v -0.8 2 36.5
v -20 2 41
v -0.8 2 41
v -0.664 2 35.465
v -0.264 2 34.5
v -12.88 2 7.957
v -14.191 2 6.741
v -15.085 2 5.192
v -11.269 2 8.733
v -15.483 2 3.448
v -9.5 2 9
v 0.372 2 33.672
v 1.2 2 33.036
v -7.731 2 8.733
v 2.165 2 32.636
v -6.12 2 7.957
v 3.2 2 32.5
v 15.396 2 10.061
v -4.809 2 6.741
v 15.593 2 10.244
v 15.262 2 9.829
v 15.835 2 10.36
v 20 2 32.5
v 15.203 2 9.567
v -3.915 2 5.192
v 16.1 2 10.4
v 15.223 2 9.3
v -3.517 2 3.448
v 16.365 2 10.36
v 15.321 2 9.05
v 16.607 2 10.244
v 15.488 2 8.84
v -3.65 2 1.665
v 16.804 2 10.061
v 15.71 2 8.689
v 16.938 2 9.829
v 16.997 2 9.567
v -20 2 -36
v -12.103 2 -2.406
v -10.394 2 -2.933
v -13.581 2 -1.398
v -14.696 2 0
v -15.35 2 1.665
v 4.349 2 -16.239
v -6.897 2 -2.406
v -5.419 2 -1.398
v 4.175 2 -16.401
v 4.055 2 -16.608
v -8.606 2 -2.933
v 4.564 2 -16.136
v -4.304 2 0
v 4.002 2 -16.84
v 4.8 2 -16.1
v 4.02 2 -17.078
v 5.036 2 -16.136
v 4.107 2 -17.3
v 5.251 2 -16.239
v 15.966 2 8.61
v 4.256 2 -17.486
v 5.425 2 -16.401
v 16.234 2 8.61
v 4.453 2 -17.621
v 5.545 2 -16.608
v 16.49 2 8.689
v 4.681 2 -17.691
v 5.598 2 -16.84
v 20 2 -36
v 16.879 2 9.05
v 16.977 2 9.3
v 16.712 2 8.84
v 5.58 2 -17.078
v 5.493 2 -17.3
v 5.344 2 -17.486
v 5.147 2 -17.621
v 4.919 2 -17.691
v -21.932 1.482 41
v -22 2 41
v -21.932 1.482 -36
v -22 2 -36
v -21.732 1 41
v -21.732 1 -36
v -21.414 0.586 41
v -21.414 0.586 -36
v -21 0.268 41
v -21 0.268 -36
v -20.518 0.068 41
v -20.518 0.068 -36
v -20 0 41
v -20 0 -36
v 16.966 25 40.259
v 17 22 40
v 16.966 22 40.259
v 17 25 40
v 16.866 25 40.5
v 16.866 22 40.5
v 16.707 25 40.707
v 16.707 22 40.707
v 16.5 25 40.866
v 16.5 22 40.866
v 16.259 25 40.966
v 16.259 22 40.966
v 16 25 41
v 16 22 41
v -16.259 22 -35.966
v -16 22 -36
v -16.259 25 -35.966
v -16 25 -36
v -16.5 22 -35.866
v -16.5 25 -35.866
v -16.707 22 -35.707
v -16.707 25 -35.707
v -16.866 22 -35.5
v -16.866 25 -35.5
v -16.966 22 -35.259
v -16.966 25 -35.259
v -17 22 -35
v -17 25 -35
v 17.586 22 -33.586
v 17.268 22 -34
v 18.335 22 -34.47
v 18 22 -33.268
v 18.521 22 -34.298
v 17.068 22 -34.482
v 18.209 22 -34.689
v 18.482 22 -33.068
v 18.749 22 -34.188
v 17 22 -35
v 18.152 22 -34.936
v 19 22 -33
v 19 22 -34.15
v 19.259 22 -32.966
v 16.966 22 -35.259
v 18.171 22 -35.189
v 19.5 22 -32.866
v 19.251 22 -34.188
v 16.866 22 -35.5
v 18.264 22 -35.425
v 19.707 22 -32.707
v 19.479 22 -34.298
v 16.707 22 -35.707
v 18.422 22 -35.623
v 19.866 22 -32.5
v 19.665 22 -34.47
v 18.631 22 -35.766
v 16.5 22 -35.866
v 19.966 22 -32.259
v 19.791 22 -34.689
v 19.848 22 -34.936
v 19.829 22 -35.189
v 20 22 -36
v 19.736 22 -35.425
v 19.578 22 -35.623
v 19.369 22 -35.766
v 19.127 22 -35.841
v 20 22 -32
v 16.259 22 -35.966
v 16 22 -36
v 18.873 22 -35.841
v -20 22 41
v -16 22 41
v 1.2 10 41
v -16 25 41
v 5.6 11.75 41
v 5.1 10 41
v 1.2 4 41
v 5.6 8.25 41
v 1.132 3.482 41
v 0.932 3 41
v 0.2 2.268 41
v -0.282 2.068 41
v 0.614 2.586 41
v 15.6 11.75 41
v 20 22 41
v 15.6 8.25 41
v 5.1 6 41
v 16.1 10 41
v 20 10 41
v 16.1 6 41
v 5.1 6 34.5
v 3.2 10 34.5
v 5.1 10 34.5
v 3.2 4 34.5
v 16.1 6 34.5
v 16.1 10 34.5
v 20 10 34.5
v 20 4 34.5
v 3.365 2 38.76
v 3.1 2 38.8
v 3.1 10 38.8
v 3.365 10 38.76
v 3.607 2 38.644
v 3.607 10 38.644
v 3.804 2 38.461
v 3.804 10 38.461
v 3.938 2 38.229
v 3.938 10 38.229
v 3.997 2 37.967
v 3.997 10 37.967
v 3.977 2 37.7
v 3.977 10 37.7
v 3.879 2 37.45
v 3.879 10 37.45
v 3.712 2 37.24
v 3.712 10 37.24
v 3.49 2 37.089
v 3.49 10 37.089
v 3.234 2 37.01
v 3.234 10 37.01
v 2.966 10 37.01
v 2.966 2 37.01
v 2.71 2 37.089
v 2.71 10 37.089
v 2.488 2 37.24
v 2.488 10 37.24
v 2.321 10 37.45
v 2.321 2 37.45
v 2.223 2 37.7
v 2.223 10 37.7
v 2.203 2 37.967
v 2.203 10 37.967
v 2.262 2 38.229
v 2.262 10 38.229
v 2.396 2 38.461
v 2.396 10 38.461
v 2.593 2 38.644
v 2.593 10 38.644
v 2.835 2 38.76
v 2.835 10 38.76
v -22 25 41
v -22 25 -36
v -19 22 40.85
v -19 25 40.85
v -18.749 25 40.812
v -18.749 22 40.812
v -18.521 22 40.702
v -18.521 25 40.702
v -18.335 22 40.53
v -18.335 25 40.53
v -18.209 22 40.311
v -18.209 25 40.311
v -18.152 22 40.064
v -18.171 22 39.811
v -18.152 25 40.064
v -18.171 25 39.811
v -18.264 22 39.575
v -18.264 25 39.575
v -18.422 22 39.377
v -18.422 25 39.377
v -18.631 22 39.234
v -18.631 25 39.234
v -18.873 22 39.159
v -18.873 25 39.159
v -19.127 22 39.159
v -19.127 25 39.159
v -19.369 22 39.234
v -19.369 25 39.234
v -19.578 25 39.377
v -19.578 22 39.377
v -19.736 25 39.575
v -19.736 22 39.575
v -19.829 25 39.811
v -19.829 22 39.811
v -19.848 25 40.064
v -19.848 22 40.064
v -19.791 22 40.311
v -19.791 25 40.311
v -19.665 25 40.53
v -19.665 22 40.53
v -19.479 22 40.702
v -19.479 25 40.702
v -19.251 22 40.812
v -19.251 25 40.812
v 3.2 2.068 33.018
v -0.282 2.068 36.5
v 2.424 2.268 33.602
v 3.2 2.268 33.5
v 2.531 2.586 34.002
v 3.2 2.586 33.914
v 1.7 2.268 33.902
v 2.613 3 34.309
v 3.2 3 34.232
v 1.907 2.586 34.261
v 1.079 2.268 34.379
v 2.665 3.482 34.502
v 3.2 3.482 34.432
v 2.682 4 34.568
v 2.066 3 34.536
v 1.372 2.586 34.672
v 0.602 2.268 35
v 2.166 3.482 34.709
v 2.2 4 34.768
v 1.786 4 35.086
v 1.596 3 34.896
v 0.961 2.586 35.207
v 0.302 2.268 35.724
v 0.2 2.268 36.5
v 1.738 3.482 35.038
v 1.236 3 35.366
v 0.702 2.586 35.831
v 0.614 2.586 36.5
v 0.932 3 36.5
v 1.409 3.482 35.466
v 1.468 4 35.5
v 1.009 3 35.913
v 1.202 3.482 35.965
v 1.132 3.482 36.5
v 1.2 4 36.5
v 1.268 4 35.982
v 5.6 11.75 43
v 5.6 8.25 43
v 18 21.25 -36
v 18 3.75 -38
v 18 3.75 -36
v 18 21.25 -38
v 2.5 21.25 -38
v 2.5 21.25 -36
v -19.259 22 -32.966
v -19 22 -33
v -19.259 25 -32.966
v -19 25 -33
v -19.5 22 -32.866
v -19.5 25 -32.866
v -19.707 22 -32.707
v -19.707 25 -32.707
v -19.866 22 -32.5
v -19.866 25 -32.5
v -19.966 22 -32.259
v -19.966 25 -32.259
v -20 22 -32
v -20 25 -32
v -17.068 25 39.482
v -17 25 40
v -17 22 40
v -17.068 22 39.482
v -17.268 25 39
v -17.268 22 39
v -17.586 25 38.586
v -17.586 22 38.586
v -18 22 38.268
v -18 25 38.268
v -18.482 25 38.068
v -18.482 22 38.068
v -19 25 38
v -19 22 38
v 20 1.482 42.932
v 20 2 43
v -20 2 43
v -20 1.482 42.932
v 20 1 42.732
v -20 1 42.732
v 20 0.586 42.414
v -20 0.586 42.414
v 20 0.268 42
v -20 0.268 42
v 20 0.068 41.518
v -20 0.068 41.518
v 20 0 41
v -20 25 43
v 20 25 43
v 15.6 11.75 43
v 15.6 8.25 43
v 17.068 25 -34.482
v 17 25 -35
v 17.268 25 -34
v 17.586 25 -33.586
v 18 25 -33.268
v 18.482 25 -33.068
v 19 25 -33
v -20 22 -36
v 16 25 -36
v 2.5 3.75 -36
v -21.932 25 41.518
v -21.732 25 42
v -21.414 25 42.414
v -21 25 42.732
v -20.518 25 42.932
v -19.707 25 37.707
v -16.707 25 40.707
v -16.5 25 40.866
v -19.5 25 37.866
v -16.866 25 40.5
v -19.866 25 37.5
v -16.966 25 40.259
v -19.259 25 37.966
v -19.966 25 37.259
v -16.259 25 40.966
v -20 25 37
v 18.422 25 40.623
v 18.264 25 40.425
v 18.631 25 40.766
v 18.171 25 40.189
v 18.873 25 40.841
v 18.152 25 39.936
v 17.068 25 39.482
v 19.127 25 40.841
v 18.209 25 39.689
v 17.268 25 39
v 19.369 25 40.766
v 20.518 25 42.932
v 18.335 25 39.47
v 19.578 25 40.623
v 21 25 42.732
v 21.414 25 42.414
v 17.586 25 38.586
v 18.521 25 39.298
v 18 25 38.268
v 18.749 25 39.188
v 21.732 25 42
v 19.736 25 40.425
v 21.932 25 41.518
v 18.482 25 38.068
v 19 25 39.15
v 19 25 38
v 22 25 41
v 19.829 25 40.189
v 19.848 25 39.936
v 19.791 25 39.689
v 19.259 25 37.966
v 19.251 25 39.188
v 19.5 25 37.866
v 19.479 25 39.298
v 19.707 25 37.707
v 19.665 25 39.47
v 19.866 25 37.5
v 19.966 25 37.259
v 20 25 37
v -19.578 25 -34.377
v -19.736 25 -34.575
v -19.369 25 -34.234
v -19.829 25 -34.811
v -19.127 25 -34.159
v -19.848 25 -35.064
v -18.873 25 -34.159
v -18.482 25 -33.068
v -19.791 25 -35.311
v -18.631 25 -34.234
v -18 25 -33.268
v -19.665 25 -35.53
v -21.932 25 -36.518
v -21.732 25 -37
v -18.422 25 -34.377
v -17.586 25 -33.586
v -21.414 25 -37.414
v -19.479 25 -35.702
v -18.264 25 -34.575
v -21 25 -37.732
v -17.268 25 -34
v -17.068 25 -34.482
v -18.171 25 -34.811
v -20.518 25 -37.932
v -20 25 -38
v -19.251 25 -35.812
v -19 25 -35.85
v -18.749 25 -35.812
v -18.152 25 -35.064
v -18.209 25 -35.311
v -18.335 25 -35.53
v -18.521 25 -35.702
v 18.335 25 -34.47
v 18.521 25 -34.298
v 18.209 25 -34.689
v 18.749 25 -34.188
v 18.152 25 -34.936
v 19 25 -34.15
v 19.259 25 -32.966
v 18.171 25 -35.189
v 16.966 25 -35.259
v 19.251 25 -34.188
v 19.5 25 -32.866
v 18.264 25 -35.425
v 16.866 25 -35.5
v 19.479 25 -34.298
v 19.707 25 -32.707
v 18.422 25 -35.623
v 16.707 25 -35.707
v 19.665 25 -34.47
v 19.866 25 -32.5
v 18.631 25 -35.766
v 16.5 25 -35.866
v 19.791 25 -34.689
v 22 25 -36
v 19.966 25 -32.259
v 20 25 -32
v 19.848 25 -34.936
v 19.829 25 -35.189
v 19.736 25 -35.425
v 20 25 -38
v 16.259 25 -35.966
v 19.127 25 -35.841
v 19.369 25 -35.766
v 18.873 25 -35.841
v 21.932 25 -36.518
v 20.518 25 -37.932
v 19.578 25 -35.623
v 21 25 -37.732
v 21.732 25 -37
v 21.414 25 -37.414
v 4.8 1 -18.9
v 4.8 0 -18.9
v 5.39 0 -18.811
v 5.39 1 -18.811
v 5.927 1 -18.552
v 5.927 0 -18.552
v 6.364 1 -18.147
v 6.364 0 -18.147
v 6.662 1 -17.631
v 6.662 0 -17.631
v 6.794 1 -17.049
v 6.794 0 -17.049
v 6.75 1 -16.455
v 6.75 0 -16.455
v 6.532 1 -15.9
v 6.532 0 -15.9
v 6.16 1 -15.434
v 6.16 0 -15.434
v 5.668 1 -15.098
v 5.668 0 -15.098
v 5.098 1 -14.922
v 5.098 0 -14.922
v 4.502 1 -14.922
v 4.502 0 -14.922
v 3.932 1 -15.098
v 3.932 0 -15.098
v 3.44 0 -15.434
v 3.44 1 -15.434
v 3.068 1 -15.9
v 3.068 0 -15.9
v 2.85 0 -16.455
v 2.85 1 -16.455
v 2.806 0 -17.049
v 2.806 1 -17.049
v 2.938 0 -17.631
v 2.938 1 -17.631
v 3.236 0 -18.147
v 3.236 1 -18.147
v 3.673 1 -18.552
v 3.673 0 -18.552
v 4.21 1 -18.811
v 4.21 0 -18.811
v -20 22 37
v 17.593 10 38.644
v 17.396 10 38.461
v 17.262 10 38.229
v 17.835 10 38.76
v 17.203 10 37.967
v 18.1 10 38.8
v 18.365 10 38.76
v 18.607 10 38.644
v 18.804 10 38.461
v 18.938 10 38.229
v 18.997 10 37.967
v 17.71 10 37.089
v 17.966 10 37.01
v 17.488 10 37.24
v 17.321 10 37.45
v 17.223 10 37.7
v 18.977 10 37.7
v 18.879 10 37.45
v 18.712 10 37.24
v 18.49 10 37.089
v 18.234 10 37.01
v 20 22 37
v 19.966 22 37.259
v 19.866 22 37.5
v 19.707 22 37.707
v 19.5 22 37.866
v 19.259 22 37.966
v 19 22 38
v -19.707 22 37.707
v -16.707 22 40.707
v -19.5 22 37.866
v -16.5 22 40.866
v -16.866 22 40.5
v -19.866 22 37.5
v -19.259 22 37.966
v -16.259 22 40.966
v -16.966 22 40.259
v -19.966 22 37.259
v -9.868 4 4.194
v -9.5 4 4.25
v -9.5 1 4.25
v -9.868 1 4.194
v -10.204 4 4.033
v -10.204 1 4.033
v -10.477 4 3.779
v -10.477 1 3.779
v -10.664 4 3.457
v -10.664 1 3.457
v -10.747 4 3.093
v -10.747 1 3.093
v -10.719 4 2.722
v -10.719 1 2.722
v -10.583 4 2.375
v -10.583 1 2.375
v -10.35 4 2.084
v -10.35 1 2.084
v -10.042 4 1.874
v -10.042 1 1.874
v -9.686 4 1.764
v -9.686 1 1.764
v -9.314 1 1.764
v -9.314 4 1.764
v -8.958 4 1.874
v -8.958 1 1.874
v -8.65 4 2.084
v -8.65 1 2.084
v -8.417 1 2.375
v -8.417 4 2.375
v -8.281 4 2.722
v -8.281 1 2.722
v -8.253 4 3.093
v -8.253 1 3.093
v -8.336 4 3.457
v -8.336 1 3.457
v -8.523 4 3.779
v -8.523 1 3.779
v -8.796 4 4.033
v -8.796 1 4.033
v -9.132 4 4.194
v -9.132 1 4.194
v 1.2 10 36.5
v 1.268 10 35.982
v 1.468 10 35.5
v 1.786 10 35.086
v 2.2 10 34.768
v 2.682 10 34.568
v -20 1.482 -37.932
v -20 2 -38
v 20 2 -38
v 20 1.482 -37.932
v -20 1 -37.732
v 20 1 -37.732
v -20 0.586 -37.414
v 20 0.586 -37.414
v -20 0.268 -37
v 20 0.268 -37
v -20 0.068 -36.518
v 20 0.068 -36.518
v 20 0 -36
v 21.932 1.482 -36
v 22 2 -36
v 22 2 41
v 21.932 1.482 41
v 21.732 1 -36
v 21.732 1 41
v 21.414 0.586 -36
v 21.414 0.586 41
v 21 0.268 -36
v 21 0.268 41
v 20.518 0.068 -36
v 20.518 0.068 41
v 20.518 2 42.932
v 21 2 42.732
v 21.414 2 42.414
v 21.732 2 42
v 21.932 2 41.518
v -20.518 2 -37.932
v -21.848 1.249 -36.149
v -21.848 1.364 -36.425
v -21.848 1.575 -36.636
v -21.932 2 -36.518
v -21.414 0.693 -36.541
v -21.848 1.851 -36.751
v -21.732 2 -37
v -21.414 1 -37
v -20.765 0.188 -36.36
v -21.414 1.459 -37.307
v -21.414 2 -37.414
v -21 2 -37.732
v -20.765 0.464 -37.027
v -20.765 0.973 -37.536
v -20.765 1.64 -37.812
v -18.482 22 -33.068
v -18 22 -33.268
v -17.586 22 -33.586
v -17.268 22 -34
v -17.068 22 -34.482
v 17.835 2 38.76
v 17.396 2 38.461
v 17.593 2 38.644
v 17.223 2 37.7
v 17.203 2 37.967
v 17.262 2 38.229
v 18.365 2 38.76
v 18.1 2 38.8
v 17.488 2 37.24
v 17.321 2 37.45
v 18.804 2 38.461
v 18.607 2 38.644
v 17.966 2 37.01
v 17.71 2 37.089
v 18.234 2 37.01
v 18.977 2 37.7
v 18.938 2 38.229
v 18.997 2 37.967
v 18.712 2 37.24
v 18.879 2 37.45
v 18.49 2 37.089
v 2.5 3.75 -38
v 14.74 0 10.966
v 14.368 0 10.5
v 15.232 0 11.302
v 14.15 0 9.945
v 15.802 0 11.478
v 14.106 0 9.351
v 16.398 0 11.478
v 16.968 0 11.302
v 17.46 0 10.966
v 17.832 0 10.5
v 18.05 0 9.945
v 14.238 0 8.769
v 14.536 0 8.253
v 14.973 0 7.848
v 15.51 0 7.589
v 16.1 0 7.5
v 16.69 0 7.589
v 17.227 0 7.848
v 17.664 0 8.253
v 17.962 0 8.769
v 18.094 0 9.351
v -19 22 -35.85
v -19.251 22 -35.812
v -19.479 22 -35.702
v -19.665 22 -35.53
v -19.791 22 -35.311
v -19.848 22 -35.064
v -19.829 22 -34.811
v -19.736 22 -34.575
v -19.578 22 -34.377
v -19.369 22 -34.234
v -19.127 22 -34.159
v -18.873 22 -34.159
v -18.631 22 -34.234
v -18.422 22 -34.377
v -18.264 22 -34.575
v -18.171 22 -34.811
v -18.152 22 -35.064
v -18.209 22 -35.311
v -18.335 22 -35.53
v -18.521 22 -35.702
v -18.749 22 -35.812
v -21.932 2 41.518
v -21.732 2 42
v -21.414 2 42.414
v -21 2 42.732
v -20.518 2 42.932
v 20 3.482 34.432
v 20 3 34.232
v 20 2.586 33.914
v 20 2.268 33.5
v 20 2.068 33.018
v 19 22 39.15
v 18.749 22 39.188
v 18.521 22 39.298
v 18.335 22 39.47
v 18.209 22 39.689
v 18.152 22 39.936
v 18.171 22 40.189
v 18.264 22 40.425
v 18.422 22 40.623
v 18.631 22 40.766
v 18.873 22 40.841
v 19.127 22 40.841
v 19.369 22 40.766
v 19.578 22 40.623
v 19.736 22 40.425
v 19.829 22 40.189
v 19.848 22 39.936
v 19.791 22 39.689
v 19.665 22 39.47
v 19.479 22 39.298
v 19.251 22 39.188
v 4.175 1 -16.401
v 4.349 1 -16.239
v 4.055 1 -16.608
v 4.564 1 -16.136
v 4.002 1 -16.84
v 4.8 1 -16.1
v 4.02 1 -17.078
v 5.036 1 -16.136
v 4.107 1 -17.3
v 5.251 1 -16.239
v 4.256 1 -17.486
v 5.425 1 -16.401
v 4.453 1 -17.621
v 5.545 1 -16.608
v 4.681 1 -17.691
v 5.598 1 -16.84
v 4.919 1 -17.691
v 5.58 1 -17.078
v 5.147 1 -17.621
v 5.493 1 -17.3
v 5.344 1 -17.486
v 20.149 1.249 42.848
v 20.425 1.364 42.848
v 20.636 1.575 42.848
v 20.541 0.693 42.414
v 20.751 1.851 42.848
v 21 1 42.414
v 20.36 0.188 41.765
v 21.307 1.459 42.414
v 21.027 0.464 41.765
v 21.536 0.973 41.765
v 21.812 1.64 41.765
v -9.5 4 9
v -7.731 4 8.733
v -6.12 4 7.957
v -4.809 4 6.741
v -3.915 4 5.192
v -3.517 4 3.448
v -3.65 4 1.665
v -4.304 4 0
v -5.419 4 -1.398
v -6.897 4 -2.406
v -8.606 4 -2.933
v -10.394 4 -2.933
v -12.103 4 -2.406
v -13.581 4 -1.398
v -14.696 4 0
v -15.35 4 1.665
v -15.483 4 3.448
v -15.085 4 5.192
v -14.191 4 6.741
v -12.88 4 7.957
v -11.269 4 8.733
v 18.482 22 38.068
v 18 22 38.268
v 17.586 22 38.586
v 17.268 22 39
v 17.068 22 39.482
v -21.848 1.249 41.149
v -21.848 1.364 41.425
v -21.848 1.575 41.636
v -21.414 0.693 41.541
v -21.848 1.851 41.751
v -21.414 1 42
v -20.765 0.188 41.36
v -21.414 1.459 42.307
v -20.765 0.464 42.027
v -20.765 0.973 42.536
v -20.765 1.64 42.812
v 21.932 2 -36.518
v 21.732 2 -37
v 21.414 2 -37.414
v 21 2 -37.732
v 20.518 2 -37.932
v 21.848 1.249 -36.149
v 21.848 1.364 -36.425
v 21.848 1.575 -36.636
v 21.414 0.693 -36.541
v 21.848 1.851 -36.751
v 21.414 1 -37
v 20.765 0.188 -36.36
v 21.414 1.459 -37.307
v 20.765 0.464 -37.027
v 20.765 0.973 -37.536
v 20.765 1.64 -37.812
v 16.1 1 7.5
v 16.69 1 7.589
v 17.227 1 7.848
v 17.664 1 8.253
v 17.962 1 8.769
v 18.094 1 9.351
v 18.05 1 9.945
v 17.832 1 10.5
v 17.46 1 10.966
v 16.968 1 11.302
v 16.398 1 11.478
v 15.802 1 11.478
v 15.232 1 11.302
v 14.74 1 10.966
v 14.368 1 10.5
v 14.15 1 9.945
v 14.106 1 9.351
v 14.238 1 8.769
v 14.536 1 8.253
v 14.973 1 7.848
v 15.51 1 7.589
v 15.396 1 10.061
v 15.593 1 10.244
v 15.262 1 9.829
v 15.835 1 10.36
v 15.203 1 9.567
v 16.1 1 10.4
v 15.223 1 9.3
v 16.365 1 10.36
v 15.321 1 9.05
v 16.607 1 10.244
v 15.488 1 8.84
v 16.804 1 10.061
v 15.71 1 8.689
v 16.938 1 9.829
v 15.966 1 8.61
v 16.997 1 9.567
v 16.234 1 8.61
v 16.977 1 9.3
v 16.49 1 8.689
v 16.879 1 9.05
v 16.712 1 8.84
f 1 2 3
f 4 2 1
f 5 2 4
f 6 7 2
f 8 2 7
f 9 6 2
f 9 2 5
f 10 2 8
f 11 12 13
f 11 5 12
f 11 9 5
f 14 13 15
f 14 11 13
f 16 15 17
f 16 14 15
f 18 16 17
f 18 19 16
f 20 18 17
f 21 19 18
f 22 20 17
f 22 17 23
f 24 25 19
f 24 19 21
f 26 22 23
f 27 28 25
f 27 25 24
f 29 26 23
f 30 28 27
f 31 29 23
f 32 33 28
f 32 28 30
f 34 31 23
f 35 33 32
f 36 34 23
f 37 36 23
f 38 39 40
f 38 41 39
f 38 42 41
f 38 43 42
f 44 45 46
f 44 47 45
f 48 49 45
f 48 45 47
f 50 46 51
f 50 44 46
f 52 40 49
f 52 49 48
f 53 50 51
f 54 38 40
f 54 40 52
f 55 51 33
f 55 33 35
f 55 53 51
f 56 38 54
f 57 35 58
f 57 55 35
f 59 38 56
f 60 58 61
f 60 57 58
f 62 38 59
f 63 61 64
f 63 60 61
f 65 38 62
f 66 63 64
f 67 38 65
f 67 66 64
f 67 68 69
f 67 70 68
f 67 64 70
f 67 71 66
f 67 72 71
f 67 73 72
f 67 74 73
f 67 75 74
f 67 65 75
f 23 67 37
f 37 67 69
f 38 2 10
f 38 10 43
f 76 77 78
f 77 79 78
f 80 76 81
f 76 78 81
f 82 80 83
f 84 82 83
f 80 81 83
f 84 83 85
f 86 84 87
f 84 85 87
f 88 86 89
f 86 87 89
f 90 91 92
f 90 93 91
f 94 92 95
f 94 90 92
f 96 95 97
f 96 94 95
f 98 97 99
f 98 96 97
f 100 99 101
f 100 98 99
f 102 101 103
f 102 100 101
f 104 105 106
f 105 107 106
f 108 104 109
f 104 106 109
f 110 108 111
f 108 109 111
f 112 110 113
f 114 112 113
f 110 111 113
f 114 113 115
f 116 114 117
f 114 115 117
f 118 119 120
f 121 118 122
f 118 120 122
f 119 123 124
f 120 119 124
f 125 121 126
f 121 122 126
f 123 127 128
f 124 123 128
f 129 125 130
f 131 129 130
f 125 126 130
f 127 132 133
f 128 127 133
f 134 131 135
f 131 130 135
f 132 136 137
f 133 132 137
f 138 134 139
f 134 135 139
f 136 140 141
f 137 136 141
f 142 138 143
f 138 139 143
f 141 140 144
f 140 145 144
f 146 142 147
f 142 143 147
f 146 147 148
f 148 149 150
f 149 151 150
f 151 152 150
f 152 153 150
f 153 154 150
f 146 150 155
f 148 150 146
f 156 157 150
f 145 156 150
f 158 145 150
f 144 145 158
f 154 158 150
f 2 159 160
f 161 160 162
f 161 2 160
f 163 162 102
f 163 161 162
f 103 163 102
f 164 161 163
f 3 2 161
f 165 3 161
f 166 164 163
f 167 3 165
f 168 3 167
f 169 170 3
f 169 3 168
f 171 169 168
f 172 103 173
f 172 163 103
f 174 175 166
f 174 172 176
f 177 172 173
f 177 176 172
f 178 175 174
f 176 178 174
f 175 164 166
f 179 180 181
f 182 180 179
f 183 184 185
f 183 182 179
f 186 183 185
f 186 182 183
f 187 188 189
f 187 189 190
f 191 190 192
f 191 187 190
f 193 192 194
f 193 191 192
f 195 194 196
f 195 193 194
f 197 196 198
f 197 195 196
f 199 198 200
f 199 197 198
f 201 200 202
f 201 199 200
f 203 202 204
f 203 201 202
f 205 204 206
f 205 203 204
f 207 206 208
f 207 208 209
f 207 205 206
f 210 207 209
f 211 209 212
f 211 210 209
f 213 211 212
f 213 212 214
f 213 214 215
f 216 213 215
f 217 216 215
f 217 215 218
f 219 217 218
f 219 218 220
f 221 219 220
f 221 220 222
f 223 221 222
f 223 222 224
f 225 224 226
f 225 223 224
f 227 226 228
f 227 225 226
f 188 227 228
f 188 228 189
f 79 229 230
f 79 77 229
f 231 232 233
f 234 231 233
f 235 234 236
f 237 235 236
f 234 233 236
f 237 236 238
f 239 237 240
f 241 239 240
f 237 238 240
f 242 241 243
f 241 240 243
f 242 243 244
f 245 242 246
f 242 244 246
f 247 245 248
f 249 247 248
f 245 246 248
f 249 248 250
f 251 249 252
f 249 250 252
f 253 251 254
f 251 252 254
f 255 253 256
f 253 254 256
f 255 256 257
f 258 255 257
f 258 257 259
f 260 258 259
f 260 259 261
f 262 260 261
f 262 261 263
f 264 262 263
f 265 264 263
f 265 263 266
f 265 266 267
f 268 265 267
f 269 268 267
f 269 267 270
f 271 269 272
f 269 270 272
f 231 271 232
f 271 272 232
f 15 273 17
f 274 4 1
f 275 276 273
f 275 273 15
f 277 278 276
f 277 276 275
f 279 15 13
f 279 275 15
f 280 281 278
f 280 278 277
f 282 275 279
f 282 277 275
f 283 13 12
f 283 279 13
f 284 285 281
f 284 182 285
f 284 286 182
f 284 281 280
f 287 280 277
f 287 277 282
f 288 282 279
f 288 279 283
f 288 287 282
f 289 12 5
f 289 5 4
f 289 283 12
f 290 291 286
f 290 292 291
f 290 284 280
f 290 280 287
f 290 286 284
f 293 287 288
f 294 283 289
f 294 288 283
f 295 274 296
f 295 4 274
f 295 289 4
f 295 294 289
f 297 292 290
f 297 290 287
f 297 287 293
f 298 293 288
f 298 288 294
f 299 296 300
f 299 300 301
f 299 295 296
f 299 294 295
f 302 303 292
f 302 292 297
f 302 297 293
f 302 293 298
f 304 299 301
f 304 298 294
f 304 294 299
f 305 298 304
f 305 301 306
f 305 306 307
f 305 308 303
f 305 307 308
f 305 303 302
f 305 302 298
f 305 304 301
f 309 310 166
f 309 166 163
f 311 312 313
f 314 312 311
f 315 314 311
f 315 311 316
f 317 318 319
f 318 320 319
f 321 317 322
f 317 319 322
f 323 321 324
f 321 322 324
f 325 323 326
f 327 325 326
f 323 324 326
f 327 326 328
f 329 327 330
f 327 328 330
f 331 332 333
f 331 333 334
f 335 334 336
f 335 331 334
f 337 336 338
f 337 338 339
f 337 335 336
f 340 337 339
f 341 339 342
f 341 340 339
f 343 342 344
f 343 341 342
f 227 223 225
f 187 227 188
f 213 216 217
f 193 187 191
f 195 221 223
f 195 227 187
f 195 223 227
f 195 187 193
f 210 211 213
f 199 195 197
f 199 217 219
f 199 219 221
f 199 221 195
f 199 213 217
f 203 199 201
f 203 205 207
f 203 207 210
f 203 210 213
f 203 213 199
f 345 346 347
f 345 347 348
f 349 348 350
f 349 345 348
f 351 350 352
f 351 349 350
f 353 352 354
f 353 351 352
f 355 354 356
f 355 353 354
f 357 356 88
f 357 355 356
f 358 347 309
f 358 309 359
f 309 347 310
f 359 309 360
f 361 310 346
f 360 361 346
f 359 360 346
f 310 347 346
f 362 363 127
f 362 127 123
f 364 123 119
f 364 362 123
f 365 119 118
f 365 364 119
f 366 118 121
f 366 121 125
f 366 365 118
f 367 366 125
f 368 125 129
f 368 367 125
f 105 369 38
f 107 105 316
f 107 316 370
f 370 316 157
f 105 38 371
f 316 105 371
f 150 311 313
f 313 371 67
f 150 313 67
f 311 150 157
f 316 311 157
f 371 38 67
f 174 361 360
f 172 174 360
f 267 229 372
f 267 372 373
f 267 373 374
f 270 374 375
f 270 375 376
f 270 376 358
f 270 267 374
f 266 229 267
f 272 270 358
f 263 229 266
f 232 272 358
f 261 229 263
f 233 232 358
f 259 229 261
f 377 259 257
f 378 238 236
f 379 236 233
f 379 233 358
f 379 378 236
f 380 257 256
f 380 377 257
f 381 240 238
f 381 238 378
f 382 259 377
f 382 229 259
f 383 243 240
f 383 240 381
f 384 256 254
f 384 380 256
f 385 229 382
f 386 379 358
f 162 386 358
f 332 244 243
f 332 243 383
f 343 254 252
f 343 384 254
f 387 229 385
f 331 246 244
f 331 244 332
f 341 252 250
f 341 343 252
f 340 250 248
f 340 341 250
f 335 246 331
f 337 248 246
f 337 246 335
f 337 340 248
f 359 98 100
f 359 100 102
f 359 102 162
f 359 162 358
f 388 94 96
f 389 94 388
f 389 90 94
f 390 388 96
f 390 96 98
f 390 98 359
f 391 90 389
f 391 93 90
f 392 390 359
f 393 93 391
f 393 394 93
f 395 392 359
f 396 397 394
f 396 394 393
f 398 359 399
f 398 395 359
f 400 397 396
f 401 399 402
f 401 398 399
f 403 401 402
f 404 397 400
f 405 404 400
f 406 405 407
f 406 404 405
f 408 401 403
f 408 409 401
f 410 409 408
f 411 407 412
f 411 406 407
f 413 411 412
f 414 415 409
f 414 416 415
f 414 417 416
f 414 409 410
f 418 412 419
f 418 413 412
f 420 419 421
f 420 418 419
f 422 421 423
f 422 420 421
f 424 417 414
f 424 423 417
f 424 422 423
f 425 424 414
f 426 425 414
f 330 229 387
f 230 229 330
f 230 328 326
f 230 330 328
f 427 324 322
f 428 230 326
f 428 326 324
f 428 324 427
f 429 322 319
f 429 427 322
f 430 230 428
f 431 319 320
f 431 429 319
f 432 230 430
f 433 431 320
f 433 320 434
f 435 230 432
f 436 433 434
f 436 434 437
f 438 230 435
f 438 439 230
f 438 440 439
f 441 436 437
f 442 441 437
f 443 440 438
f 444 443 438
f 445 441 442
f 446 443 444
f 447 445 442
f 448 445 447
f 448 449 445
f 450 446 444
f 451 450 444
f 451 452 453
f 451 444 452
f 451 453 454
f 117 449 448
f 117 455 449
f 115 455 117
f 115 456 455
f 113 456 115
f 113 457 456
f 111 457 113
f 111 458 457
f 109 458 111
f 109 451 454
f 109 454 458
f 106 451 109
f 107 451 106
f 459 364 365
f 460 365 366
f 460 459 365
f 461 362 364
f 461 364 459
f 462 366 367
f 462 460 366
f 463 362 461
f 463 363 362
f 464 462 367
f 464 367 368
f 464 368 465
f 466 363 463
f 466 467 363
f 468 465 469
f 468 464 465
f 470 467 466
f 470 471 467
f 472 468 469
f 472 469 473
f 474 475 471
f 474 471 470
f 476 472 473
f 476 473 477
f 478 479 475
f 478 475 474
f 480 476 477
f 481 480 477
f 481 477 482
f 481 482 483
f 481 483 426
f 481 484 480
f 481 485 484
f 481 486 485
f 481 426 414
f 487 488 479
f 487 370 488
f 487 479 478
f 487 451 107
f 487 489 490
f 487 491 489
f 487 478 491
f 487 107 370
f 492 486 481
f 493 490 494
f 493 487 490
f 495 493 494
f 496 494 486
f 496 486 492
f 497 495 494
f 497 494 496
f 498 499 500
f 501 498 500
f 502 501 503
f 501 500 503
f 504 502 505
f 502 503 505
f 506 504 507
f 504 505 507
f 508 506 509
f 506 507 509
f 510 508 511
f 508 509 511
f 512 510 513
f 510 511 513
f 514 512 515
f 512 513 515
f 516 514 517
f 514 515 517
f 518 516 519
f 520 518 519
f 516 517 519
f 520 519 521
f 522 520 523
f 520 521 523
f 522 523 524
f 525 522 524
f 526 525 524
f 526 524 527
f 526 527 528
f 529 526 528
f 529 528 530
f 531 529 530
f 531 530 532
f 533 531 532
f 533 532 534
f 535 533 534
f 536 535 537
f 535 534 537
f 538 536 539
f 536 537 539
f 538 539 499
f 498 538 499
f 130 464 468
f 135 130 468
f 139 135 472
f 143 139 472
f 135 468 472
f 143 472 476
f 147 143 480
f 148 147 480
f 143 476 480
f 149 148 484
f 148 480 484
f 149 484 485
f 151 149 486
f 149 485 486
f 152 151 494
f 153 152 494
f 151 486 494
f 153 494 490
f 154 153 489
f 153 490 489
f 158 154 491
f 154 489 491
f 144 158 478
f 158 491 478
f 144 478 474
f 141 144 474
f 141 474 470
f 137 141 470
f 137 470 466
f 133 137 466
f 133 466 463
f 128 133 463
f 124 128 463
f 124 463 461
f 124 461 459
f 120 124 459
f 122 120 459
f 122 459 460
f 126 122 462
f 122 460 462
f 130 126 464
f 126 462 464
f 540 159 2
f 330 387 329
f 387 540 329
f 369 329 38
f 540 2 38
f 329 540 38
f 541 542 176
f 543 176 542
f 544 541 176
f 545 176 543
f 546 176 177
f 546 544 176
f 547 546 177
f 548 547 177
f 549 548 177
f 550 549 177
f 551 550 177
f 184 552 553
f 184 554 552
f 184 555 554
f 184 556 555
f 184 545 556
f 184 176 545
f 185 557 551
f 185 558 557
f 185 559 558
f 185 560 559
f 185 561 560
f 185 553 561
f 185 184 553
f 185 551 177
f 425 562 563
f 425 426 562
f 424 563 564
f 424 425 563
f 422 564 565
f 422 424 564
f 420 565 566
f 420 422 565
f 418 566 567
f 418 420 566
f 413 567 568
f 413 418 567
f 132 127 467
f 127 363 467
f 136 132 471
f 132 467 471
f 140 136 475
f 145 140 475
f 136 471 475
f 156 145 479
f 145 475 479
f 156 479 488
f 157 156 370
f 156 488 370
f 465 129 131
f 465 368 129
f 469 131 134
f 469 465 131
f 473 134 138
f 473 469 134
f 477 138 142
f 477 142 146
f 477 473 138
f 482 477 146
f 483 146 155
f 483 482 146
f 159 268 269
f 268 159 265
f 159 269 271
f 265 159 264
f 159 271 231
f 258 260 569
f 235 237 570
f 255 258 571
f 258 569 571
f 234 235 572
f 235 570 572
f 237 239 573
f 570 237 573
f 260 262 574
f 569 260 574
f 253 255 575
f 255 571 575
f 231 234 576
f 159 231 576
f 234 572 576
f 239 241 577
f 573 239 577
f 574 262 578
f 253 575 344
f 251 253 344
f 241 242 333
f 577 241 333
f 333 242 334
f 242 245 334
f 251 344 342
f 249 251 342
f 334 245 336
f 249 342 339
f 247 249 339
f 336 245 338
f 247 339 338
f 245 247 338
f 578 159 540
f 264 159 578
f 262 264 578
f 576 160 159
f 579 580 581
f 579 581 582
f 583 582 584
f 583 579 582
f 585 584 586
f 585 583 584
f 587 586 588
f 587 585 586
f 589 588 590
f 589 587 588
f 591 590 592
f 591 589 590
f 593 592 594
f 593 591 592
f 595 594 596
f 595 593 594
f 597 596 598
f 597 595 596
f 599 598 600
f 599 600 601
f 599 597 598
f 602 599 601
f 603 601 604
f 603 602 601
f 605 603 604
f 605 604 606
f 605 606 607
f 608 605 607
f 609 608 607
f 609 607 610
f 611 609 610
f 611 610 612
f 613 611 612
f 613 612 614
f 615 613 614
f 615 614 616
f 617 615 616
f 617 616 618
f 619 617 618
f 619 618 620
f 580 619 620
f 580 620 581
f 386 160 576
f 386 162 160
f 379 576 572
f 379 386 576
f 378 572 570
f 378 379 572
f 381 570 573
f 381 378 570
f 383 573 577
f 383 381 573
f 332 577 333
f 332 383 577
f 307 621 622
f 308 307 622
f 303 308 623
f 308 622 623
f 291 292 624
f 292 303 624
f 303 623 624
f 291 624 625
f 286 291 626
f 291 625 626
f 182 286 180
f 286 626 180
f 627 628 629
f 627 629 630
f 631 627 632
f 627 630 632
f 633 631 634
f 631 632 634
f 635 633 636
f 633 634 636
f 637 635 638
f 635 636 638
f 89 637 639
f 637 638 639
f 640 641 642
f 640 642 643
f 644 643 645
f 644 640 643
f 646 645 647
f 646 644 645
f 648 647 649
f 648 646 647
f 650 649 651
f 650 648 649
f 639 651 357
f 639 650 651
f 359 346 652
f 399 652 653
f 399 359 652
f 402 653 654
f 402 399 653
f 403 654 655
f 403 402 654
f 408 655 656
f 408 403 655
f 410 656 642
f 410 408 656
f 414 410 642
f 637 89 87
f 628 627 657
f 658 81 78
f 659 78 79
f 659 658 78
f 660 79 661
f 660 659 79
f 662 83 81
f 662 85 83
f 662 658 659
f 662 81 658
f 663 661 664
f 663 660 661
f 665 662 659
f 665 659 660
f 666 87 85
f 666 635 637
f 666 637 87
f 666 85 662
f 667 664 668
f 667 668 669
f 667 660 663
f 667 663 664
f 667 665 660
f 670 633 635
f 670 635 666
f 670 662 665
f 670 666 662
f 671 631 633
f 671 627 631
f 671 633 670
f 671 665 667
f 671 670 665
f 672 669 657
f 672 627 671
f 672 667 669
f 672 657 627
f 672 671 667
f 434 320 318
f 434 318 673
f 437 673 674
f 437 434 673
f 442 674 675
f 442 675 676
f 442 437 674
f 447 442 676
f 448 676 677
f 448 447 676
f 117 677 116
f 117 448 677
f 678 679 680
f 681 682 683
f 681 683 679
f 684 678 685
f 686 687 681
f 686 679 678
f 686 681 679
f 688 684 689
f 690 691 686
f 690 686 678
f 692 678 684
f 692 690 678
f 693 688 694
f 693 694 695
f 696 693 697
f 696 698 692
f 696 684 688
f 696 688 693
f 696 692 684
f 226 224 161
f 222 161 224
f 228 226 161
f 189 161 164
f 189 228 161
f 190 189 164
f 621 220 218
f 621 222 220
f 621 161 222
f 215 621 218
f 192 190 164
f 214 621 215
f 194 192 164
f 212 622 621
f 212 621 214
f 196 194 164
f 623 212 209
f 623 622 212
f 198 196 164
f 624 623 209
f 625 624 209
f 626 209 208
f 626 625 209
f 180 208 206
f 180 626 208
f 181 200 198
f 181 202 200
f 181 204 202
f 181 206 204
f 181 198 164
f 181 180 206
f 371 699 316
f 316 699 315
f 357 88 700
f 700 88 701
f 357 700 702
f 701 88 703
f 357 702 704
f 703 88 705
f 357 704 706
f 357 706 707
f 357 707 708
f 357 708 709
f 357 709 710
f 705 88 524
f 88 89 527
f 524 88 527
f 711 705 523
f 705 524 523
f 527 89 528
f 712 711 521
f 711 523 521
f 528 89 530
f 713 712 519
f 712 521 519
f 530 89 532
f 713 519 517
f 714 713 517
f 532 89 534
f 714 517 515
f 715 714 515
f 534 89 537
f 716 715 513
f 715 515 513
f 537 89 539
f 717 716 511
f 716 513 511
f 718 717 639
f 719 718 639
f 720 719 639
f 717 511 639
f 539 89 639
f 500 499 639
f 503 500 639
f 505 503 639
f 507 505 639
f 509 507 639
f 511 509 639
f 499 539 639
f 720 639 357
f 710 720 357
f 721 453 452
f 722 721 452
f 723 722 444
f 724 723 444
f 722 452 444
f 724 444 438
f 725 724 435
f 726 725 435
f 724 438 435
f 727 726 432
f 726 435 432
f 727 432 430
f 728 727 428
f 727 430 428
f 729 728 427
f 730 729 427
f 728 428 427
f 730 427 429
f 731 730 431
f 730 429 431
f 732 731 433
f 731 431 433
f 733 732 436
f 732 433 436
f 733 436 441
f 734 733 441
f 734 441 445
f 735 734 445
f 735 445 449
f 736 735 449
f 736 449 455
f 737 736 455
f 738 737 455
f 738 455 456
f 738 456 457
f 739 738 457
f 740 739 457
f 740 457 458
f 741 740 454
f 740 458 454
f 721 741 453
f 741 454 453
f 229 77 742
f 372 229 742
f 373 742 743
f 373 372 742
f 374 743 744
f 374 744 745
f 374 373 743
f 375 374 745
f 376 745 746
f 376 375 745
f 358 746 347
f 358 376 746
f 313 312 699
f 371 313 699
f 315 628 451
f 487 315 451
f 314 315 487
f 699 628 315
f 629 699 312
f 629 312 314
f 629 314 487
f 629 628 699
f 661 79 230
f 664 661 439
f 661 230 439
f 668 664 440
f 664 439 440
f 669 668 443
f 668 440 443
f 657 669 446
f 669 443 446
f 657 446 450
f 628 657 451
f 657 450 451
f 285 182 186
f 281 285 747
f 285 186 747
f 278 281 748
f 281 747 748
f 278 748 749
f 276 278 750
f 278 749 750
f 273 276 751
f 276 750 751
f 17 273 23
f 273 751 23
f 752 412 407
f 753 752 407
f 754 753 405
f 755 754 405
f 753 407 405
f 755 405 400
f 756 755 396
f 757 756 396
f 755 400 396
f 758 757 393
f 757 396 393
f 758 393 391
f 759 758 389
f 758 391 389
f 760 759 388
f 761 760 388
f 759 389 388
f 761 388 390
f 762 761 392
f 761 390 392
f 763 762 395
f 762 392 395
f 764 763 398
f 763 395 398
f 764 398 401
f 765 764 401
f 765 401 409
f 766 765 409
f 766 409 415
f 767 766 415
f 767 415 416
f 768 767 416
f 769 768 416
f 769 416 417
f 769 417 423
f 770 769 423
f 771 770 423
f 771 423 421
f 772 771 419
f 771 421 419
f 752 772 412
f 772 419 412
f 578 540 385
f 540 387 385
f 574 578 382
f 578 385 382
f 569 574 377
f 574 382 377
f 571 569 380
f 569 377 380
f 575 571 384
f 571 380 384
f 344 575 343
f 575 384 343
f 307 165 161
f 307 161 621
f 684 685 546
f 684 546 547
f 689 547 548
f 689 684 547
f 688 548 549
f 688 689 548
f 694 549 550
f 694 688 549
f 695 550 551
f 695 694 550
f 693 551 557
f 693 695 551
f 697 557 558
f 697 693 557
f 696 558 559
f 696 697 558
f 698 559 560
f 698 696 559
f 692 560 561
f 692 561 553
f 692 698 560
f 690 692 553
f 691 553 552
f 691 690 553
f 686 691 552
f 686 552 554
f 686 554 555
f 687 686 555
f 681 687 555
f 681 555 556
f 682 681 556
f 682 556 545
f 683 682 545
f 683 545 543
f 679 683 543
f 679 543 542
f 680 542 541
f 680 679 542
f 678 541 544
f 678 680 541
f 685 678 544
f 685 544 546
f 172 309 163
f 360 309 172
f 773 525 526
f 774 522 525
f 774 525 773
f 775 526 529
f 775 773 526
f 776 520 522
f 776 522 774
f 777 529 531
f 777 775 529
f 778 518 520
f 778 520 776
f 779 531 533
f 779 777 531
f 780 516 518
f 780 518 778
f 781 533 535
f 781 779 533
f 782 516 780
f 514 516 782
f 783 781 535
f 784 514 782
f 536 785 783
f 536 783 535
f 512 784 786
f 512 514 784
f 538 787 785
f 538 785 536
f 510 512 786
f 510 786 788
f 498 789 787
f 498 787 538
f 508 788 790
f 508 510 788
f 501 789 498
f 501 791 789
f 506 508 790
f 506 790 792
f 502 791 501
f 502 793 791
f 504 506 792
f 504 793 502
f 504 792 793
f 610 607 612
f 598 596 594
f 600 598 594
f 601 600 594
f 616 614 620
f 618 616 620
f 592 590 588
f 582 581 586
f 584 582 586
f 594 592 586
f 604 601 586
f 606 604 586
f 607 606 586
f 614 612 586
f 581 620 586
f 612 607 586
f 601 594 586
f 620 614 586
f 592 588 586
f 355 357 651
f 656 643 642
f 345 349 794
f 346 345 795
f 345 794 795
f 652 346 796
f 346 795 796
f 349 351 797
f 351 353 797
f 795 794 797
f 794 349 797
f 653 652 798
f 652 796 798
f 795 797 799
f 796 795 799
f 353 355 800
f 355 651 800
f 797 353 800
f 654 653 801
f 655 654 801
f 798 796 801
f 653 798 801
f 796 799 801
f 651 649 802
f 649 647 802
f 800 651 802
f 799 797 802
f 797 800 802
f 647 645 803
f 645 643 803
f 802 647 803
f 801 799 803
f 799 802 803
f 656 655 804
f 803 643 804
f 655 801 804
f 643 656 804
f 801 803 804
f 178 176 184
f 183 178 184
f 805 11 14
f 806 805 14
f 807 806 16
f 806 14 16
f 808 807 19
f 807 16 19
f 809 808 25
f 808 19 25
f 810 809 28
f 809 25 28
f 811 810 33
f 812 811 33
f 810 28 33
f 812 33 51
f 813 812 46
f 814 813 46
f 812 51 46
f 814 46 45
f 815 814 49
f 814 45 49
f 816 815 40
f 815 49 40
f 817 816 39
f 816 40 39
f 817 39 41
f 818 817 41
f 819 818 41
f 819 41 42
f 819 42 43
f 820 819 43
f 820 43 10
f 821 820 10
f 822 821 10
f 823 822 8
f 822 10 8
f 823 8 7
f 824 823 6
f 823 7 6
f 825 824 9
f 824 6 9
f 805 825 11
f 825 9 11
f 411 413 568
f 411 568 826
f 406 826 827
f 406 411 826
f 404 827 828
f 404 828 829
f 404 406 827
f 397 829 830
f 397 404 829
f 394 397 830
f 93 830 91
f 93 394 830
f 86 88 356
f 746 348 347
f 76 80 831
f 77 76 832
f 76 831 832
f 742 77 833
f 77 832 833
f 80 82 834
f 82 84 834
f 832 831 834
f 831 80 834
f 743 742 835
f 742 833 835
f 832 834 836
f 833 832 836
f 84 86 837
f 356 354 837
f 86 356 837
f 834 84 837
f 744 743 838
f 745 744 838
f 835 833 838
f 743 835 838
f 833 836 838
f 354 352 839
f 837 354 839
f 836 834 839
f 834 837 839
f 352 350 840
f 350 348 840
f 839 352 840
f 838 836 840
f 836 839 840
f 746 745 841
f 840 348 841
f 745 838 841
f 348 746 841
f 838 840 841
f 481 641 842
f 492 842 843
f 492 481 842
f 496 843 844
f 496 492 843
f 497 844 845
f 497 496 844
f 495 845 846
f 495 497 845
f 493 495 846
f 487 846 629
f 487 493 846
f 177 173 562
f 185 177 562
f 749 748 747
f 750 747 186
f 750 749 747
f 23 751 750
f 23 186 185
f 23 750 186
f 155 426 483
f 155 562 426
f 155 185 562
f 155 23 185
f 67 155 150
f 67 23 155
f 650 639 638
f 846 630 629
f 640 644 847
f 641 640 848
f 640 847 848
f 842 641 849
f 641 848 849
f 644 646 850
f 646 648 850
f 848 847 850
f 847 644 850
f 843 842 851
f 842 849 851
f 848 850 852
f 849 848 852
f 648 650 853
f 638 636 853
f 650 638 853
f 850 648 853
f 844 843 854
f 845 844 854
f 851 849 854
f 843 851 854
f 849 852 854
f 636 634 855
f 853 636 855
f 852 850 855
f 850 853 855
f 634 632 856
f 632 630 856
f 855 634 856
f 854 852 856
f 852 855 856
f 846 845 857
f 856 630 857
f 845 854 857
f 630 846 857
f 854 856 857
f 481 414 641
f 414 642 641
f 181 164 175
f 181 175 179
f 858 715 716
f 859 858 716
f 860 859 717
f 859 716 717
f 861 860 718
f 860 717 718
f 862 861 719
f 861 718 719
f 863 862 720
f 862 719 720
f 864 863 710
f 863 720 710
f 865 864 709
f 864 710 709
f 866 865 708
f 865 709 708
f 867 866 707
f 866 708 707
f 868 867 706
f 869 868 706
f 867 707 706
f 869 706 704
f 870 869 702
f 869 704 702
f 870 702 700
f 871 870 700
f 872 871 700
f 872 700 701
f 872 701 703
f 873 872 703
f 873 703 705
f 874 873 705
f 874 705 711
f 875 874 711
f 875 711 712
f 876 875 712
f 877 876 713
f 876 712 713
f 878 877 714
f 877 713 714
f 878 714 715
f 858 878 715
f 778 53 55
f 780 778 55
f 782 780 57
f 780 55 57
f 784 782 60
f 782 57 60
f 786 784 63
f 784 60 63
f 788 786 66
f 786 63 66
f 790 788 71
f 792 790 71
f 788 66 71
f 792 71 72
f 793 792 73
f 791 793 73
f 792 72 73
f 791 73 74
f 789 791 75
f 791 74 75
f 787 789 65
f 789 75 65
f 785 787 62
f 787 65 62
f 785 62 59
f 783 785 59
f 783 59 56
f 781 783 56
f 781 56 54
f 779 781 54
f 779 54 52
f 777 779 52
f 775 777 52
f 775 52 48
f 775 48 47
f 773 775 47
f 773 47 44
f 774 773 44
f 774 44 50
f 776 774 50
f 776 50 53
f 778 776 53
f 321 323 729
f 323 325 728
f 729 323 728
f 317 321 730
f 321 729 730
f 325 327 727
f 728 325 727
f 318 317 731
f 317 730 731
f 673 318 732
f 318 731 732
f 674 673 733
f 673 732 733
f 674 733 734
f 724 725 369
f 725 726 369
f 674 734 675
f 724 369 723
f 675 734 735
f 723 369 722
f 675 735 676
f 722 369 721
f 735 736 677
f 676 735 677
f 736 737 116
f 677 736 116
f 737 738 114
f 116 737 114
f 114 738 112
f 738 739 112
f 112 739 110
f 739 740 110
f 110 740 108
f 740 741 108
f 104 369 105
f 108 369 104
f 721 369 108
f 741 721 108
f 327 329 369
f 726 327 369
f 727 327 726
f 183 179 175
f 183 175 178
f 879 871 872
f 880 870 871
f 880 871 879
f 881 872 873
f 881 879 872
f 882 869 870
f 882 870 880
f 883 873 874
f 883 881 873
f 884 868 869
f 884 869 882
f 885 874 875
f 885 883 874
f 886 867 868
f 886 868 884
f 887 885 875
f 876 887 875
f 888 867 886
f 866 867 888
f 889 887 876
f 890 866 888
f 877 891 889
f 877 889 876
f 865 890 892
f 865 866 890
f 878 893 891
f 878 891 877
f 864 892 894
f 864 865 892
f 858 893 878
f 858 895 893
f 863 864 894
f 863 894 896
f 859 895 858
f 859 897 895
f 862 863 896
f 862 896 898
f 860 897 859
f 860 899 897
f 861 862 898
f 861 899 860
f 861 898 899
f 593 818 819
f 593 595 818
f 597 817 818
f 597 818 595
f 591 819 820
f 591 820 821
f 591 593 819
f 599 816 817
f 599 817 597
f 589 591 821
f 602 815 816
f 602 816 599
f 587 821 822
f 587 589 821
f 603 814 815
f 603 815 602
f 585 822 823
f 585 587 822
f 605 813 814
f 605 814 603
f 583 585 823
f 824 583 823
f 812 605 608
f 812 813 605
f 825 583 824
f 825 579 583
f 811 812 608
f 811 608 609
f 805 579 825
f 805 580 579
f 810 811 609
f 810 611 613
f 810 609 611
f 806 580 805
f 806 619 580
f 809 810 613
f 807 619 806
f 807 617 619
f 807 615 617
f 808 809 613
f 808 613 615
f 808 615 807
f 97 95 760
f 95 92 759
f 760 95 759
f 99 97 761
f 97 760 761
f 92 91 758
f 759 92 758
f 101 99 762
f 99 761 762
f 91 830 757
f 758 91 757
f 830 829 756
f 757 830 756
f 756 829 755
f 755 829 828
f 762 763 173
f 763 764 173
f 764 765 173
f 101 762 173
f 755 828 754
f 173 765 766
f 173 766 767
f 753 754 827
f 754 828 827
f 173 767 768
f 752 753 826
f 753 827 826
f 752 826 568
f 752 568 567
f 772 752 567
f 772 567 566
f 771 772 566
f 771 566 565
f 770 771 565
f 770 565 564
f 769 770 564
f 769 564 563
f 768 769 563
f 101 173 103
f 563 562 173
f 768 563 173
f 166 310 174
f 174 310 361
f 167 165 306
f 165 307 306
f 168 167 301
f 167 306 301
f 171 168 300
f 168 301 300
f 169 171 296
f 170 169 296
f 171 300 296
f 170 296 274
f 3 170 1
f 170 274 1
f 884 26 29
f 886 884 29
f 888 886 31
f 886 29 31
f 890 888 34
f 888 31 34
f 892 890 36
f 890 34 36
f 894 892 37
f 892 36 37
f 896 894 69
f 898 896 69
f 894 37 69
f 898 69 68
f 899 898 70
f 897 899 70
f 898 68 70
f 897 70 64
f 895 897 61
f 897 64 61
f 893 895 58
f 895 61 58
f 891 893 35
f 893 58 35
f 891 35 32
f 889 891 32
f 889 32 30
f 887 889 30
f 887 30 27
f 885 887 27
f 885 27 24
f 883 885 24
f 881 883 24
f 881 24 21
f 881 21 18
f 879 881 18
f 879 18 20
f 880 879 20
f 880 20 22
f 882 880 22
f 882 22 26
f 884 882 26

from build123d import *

# Parameters (mm, degrees)
SKETCH_1_W           = 44
SKETCH_1_H           = 81
EXTRUDE_1_DEPTH      = 25
SHELL_1_T            = -2
FILLET_1_R           = 2
SKETCH_2_R           = 0.8
SKETCH_2_R_2         = 0.9
CUT_EXTRUDE_1_DEPTH  = 24
SKETCH_3_R           = 1.25
CUT_EXTRUDE_2_DEPTH  = 24
SKETCH_4_R           = 6
EXTRUDE_2_DEPTH      = 2
CUT_EXTRUDE_START    = -13.2
SKETCH_6_R           = 1.25
CUT_EXTRUDE_4_DEPTH  = 13.2
SKETCH_7_W           = 15.5
SKETCH_7_H           = 17.5
CUT_EXTRUDE_5_DEPTH  = 13.2
SKETCH_9_W           = 18.8
SKETCH_9_H           = 6.5
SKETCH_9_R           = 0.9
EXTRUDE_3_DEPTH      = 8
SKETCH_11_W          = 11
SKETCH_11_H          = 6.5
CUT_EXTRUDE_6_DEPTH  = 4
SKETCH_12_W          = 10
SKETCH_12_H          = 3.5
CUT_EXTRUDE_7_DEPTH  = 4
FILLET_2_R           = 2
EXTRUDE_START        = -1
SKETCH_14_R          = 1.25
EXTRUDE_4_DEPTH      = 1
SKETCH_15_R          = 2
CUT_EXTRUDE_8_DEPTH  = 1
SKETCH_17_R          = 2
EXTRUDE_5_DEPTH      = 3
SKETCH_18_R          = 0.85
CUT_EXTRUDE_10_DEPTH = 3
FILLET_4_R           = 1


with BuildPart() as part:
    # 草图1 → 凸台-拉伸1 (new body)
    with BuildSketch(Plane(origin=(0, 0, 0), x_dir=(1, 0, 0), z_dir=(0, 1, 0))):
        with Locations((0, -2.5)):
            Rectangle(SKETCH_1_W, SKETCH_1_H)
    extrude(amount=EXTRUDE_1_DEPTH)

    # 抽壳1
    shell_1_openings = [part.faces().sort_by_distance(p)[0] for p in [
        (0, 25, 2.5),
    ]]
    offset(amount=SHELL_1_T, openings=shell_1_openings, kind=Kind.INTERSECTION)

    # 圆角1
    fillet_1_edges = [part.edges().sort_by_distance(p)[0] for p in [
        (0, 0, -38),
        (22, 0, 2.5),
        (0, 0, 43),
        (-22, 0, 2.5),
        (-22, 12.5, -38),
        (22, 12.5, -38),
        (22, 12.5, 43),
        (-22, 12.5, 43),
    ]]
    fillet(fillet_1_edges, radius=FILLET_1_R)

    # 草图2 → 切除-拉伸1 (cut)
    with BuildSketch(Plane(origin=(0, 2, 0), x_dir=(1, 0, 0), z_dir=(0, 1, 0))):
        with Locations(Location((4.8, 16.9, 0), (0, 0, 270))):
            Circle(SKETCH_2_R)
        with Locations(Location((16.1, -9.5, 0), (0, 0, 270))):
            Circle(SKETCH_2_R_2)
    extrude(amount=-CUT_EXTRUDE_1_DEPTH, mode=Mode.SUBTRACT)

    # 草图3 → 切除-拉伸2 (cut)
    with BuildSketch(Plane(origin=(0, 2, 0), x_dir=(1, 0, 0), z_dir=(0, 1, 0))):
        with Locations(Location((-9.5, -3, 0), (0, 0, 270))):
            Circle(SKETCH_3_R)
    extrude(amount=-CUT_EXTRUDE_2_DEPTH, mode=Mode.SUBTRACT)

    # 草图4 → 凸台-拉伸2 (add)
    with BuildSketch(Plane(origin=(0, 2, 0), x_dir=(1, 0, 0), z_dir=(0, 1, 0))):
        with Locations(Location((-9.5, -3, 0), (0, 0, 270))):
            Circle(SKETCH_4_R)
    extrude(amount=EXTRUDE_2_DEPTH)

    # 草图6 → 切除-拉伸4 (cut)
    with BuildSketch(Plane.XZ.offset(CUT_EXTRUDE_START)):
        with Locations(Location((-9.5, 3, 0), (0, 0, 90))):
            Circle(SKETCH_6_R)
    extrude(amount=CUT_EXTRUDE_4_DEPTH, mode=Mode.SUBTRACT)

    # 草图7 → 切除-拉伸5 (cut)
    with BuildSketch(Plane(origin=(0, 0, -38), x_dir=(-1, 0, 0), z_dir=(0, 0, -1))):
        with Locations((-10.25, 12.5)):
            Rectangle(SKETCH_7_W, SKETCH_7_H)
    extrude(amount=-CUT_EXTRUDE_5_DEPTH, mode=Mode.SUBTRACT)

    # 草图9 → 凸台-拉伸3 (add)
    with BuildSketch(Plane(origin=(0, 2, 0), x_dir=(1, 0, 0), z_dir=(0, 1, 0))):
        with Locations((10.6, -37.75)):
            Rectangle(SKETCH_9_W, SKETCH_9_H)
        with Locations(Location((18.1, -37.9, 0), (0, 0, 270))):
            Circle(SKETCH_9_R, mode=Mode.SUBTRACT)
        with Locations(Location((3.1, -37.9, 0), (0, 0, 270))):
            Circle(SKETCH_9_R, mode=Mode.SUBTRACT)
    extrude(amount=EXTRUDE_3_DEPTH)

    # 草图11 → 切除-拉伸6 (cut)
    with BuildSketch(Plane(origin=(0, 10, 0), x_dir=(1, 0, 0), z_dir=(0, 1, 0))):
        with Locations((10.6, -37.75)):
            Rectangle(SKETCH_11_W, SKETCH_11_H)
    extrude(amount=-CUT_EXTRUDE_6_DEPTH, mode=Mode.SUBTRACT)

    # 草图12 → 切除-拉伸7 (cut)
    with BuildSketch(Plane.XY.offset(43)):
        with Locations((10.6, 10)):
            Rectangle(SKETCH_12_W, SKETCH_12_H)
    extrude(amount=-CUT_EXTRUDE_7_DEPTH, mode=Mode.SUBTRACT)

    # 圆角2
    fillet_2_edges = [part.edges().sort_by_distance(p)[0] for p in [
        (10.6, 2, 34.5),
        (1.2, 2, 37.75),
        (1.2, 6, 34.5),
    ]]
    fillet(fillet_2_edges, radius=FILLET_2_R)

    # 草图14 → 凸台-拉伸4 (add)
    with BuildSketch(Plane.XZ.offset(EXTRUDE_START)):
        with Locations(Location((-9.5, 3, 0), (0, 0, 90))):
            Circle(SKETCH_14_R)
    extrude(amount=EXTRUDE_4_DEPTH)

    # 草图15 → 切除-拉伸8 (cut)
    with BuildSketch(Plane.XZ):
        with Locations(Location((16.1, 9.5, 0), (0, 0, 270))):
            Circle(SKETCH_15_R)
        with Locations(Location((4.8, -16.9, 0), (0, 0, 270))):
            Circle(SKETCH_15_R)
    extrude(amount=-CUT_EXTRUDE_8_DEPTH, mode=Mode.SUBTRACT)

    # 草图17 → 凸台-拉伸5 (add)
    with BuildSketch(Plane(origin=(0, 25, 0), x_dir=(1, 0, 0), z_dir=(0, 1, 0))):
        with Locations((19, 35)):
            Circle(SKETCH_17_R)
        with Locations((-19, 35)):
            Circle(SKETCH_17_R)
        with Locations((-19, -40)):
            Circle(SKETCH_17_R)
        with Locations((19, -40)):
            Circle(SKETCH_17_R)
    extrude(amount=-EXTRUDE_5_DEPTH)

    # 草图18 → 切除-拉伸10 (cut)
    with BuildSketch(Plane(origin=(0, 25, 0), x_dir=(1, 0, 0), z_dir=(0, 1, 0))):
        with Locations(Location((19, 35, 0), (0, 0, 270))):
            Circle(SKETCH_18_R)
        with Locations(Location((-19, 35, 0), (0, 0, 90))):
            Circle(SKETCH_18_R)
        with Locations(Location((-19, -40, 0), (0, 0, 270))):
            Circle(SKETCH_18_R)
        with Locations(Location((19, -40, 0), (0, 0, 90))):
            Circle(SKETCH_18_R)
    extrude(amount=-CUT_EXTRUDE_10_DEPTH, mode=Mode.SUBTRACT)

    # 圆角4
    fillet_4_edges = [part.edges().sort_by_distance(p)[0] for p in [
        (17.267949192, 23.5, -36),
        (20, 23.5, -33.267949192),
        (-17.267949192, 23.5, -36),
        (-20, 23.5, -33.267949192),
        (-20, 23.5, 38.267949192),
        (-17.267949192, 23.5, 41),
        (17.267949192, 23.5, 41),
        (20, 23.5, 38.267949192),
    ]]
    fillet(fillet_4_edges, radius=FILLET_4_R)


solid = part.part
